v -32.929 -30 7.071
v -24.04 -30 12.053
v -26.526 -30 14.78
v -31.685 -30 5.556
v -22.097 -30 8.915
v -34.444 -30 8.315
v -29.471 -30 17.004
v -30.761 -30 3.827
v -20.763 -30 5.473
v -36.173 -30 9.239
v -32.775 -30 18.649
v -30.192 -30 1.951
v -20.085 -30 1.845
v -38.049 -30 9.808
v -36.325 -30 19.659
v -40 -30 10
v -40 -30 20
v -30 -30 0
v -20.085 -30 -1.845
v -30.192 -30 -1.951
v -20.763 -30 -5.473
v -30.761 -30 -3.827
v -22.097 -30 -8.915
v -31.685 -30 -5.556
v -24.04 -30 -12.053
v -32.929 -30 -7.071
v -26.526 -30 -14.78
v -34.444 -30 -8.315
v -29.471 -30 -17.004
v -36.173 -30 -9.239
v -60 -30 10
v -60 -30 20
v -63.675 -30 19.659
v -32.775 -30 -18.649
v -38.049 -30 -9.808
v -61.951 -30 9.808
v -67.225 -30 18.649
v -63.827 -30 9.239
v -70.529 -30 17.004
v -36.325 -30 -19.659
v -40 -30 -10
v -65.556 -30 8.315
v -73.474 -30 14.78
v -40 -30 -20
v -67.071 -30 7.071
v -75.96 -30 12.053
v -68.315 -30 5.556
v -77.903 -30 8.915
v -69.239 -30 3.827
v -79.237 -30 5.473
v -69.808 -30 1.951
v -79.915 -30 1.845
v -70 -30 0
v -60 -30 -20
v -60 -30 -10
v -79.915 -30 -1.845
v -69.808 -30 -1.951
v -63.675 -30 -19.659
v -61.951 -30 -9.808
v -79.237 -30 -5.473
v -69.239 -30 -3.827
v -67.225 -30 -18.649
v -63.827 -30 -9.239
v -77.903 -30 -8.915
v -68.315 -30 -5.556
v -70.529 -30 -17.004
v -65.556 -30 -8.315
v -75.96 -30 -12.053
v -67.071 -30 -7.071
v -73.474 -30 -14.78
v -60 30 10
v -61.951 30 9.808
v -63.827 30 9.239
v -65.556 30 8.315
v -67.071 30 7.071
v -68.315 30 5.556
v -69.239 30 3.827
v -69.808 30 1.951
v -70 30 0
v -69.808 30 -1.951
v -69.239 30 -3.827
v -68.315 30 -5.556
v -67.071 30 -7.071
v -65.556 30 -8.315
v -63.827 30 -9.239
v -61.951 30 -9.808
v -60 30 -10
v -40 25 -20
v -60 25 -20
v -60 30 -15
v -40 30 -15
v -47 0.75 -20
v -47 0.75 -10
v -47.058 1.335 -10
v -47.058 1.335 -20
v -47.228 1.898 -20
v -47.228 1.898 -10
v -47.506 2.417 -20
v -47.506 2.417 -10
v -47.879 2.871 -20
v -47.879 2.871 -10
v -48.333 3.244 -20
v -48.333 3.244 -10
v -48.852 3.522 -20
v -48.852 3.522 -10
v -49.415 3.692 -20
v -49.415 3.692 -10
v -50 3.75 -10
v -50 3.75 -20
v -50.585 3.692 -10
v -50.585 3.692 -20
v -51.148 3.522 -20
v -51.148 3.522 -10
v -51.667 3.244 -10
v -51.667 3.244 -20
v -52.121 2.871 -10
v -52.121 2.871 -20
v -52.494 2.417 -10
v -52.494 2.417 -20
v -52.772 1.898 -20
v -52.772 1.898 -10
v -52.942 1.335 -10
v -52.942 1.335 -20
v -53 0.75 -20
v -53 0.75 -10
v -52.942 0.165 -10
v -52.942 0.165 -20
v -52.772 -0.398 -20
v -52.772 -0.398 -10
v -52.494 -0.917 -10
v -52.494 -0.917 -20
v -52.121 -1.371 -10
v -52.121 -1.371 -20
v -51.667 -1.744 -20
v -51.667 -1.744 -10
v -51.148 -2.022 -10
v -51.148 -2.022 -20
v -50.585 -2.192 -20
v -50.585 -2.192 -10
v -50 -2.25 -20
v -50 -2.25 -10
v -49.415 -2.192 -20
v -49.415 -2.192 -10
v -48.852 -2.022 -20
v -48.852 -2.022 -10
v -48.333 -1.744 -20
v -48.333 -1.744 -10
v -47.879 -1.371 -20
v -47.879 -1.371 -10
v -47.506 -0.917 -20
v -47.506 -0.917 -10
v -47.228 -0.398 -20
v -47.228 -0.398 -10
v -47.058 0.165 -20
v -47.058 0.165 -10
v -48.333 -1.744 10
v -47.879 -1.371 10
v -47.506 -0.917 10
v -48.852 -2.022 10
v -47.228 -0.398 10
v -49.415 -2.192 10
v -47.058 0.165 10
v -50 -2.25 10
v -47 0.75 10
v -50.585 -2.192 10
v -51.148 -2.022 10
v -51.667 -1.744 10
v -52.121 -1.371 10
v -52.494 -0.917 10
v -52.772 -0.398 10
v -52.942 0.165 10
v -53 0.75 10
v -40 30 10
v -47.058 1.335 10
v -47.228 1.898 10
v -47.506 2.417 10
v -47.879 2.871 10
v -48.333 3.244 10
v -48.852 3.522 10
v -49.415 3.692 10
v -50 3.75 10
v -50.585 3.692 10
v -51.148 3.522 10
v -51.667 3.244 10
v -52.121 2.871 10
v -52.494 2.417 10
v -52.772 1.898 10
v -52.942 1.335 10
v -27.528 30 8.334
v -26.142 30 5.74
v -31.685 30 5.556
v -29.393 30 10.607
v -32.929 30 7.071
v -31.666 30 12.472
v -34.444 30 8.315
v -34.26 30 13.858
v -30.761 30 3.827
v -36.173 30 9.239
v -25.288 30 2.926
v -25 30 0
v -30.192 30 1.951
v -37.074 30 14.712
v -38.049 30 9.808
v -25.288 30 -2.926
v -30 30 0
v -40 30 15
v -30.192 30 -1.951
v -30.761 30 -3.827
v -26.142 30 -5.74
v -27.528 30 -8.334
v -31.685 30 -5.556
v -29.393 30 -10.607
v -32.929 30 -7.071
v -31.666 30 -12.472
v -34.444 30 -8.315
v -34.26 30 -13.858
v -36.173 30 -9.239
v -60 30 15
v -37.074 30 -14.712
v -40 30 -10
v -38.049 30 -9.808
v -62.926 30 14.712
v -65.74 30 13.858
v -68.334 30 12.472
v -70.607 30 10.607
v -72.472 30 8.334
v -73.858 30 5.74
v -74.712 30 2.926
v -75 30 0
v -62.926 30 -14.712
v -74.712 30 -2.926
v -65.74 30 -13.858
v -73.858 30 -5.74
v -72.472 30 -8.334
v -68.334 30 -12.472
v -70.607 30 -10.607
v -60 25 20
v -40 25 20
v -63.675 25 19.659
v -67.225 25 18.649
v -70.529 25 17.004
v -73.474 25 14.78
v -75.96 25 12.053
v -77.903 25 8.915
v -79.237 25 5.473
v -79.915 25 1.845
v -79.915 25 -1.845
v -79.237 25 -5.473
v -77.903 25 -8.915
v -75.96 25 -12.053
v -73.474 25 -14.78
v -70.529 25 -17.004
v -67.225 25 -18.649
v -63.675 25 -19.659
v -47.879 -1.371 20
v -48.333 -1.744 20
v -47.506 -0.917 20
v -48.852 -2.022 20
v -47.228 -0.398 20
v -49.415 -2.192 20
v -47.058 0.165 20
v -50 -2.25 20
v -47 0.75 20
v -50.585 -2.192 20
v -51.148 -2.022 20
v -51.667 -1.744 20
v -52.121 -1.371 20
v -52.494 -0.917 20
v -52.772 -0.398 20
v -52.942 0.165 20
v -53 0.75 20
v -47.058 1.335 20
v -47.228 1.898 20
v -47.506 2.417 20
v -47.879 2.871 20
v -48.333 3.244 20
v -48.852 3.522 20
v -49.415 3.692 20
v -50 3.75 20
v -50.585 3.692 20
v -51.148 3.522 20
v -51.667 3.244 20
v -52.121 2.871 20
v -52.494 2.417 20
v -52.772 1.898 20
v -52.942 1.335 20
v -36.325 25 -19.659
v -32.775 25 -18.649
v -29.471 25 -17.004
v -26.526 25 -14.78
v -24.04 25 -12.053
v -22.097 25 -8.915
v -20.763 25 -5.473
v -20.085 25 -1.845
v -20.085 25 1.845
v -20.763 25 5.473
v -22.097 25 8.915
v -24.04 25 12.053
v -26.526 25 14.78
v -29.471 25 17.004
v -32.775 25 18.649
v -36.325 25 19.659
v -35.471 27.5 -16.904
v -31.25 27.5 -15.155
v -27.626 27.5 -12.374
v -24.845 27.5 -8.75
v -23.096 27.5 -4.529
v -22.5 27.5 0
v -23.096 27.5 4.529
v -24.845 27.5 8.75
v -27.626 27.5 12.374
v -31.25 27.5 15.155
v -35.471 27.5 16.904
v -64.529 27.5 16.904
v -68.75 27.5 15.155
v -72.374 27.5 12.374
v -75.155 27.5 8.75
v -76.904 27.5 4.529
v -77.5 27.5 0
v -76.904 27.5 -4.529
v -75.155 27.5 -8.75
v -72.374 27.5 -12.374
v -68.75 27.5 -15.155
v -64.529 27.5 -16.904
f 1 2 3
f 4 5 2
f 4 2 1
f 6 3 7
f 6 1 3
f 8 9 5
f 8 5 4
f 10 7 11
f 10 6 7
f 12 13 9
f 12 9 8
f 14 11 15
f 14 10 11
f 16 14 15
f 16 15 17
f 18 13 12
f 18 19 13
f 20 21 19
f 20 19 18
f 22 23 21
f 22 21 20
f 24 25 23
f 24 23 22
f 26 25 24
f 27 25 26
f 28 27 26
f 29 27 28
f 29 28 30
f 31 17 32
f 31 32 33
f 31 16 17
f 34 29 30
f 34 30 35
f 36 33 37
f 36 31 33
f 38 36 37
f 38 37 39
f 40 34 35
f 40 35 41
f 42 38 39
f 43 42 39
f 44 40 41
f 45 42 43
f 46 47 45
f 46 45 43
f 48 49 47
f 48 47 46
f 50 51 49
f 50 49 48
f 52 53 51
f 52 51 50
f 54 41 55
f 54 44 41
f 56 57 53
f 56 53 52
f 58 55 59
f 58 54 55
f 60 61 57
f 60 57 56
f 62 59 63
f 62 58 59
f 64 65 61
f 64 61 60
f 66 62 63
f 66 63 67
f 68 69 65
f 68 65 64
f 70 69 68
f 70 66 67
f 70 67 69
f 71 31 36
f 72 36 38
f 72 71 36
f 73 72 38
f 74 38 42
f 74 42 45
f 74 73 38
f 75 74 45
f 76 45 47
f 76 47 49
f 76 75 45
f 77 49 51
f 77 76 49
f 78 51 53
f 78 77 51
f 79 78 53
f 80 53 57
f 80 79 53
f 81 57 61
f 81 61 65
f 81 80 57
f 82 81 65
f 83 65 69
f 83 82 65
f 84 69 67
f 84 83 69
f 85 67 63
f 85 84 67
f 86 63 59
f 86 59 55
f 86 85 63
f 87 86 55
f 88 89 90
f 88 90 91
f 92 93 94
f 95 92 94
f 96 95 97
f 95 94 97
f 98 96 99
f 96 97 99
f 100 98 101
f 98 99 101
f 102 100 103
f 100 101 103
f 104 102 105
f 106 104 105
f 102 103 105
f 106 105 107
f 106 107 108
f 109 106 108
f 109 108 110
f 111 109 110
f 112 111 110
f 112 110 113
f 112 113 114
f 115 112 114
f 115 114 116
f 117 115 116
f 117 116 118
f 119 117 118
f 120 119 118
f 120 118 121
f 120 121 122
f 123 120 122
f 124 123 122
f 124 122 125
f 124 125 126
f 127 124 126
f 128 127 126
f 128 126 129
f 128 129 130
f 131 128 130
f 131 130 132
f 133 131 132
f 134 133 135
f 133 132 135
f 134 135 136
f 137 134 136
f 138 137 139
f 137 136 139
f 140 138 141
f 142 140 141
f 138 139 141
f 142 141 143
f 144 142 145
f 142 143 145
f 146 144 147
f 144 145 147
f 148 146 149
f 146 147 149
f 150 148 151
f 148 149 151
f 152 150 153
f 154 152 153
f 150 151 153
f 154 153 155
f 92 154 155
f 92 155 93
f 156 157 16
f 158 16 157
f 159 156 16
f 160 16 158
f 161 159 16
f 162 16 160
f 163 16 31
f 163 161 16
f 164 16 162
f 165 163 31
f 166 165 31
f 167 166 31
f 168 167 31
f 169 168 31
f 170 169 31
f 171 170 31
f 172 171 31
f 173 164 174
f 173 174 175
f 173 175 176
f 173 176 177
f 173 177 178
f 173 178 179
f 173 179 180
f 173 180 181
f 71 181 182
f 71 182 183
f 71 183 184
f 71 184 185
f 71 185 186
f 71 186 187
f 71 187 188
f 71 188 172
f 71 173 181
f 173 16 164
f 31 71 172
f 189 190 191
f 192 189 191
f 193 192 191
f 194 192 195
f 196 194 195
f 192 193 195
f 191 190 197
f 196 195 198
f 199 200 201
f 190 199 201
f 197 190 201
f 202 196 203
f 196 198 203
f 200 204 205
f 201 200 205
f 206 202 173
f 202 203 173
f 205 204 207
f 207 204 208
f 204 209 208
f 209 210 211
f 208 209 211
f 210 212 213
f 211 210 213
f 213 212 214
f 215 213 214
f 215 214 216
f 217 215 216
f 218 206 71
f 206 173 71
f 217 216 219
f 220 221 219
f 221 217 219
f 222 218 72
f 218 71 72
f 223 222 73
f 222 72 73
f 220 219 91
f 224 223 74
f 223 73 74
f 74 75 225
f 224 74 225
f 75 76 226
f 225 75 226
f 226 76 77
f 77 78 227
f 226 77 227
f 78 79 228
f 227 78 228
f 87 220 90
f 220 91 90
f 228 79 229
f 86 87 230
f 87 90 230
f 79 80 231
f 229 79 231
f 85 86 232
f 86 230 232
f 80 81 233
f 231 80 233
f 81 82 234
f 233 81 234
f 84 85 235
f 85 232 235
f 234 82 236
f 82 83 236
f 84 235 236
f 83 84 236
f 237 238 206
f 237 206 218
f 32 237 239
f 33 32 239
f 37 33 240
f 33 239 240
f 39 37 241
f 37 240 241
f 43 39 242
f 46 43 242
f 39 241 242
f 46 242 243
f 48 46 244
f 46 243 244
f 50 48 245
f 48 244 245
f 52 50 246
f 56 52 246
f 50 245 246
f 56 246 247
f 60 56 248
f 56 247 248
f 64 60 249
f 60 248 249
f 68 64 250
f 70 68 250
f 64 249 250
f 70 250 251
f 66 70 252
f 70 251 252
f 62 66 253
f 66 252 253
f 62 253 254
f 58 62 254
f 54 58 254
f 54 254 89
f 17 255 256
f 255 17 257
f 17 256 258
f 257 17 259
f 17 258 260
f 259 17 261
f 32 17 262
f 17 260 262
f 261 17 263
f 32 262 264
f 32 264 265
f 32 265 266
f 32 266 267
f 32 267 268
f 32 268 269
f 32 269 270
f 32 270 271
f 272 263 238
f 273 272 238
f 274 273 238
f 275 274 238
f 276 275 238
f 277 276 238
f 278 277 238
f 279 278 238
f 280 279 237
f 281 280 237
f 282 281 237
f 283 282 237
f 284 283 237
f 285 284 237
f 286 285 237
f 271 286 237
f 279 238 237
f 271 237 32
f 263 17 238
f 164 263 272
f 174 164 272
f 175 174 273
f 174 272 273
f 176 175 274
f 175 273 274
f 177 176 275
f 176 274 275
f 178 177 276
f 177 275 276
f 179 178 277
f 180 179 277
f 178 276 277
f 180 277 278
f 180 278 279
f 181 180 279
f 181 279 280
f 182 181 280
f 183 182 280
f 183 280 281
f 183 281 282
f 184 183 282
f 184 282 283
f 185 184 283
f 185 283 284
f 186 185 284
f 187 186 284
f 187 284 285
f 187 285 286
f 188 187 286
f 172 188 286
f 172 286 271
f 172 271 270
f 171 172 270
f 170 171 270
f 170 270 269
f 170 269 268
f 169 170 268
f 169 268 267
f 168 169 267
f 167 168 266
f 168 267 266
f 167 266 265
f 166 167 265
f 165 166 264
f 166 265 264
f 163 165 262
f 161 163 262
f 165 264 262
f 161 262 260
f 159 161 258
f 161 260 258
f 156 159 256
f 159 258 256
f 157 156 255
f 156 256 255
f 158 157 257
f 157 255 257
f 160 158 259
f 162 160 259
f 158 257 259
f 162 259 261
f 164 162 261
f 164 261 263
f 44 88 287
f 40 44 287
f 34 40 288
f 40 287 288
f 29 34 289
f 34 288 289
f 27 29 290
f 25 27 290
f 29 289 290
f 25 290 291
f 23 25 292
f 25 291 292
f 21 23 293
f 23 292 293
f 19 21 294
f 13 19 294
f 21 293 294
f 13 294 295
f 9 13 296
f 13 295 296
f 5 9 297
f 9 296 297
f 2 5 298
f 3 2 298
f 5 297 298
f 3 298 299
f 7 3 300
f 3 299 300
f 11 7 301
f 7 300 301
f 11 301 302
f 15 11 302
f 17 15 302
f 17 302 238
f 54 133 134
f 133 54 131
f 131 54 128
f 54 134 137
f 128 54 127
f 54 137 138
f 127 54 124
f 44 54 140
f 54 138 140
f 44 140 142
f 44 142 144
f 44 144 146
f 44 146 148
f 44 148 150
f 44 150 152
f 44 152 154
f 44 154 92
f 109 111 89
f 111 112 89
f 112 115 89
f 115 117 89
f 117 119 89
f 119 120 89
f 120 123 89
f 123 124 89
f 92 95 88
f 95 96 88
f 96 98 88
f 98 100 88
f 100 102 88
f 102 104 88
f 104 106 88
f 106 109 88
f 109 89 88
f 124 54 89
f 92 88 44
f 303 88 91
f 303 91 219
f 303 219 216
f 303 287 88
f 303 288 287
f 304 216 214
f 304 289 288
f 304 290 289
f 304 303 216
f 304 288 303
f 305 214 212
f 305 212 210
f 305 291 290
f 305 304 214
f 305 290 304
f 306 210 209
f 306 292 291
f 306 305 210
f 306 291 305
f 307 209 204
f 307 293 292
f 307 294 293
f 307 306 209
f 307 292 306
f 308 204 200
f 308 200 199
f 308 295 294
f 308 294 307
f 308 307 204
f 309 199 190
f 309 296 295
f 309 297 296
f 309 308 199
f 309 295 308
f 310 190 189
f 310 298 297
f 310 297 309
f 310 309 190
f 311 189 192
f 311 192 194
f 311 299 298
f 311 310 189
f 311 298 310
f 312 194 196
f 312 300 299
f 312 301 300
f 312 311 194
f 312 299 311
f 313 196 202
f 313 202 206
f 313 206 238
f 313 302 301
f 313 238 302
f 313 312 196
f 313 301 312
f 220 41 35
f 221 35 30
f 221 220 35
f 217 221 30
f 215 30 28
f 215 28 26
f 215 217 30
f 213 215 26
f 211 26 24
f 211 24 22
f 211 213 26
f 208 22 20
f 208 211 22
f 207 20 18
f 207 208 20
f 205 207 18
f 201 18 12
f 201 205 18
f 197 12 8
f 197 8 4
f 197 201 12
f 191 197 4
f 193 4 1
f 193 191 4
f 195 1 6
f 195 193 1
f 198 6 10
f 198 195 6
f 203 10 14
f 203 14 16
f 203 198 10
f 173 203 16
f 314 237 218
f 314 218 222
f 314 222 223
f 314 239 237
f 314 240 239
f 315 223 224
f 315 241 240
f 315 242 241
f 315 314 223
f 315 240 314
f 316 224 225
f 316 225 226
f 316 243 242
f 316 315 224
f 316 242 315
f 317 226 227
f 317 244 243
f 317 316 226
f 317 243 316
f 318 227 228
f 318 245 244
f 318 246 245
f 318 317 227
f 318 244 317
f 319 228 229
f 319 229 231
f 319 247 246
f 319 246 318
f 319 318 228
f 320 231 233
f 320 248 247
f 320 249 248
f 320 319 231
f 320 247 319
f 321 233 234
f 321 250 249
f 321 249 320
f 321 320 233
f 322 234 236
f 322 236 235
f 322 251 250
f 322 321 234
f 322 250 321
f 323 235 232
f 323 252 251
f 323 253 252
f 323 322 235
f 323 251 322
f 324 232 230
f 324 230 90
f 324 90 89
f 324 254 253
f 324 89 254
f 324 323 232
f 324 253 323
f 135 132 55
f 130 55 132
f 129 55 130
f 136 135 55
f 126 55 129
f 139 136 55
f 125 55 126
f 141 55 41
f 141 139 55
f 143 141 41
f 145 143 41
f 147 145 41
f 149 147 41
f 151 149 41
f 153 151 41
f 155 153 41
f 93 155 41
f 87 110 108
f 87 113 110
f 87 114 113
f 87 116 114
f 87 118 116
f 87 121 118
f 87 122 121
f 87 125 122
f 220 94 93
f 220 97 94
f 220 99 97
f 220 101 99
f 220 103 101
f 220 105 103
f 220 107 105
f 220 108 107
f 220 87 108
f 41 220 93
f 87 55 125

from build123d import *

# Parameters (mm, degrees)
BOSS_EXTRUDE1_DEPTH = 30
CHAMFER1_SIZE       = 5
SKETCH2_R           = 3
CUT_EXTRUDE1_DEPTH  = 41


with BuildPart() as part:
    # Sketch1 → Boss-Extrude1 (new body, symmetric)
    with BuildSketch(Plane(origin=(0, 0, 0), x_dir=(1, 0, 0), z_dir=(0, 1, 0))):
        with BuildLine():
            Line((-60, 20), (-40, 20))
            ThreePointArc((-40, 20), (-20, 0), (-40, -20))
            Line((-40, -20), (-60, -20))
            ThreePointArc((-60, -20), (-80, 0), (-60, 20))
        make_face()
        with BuildLine():
            Line((-60, 10), (-40, 10))
            ThreePointArc((-40, 10), (-30, 0), (-40, -10))
            Line((-40, -10), (-60, -10))
            ThreePointArc((-60, -10), (-70, 0), (-60, 10))
        make_face(mode=Mode.SUBTRACT)
    extrude(amount=BOSS_EXTRUDE1_DEPTH, both=True)

    # Chamfer1
    chamfer1_edges = [part.edges().sort_by_distance(p)[0] for p in [
        (-20, 30, 0),
        (-50, 30, -20),
        (-80, 30, 0),
        (-50, 30, 20),
    ]]
    chamfer(chamfer1_edges, length=CHAMFER1_SIZE)

    # Sketch2 → Cut-Extrude1 (cut, through all)
    with BuildSketch(Plane.XY.offset(20)):
        with Locations((-50, 0.75)):
            Circle(SKETCH2_R)
    extrude(amount=-CUT_EXTRUDE1_DEPTH, mode=Mode.SUBTRACT)


solid = part.part
